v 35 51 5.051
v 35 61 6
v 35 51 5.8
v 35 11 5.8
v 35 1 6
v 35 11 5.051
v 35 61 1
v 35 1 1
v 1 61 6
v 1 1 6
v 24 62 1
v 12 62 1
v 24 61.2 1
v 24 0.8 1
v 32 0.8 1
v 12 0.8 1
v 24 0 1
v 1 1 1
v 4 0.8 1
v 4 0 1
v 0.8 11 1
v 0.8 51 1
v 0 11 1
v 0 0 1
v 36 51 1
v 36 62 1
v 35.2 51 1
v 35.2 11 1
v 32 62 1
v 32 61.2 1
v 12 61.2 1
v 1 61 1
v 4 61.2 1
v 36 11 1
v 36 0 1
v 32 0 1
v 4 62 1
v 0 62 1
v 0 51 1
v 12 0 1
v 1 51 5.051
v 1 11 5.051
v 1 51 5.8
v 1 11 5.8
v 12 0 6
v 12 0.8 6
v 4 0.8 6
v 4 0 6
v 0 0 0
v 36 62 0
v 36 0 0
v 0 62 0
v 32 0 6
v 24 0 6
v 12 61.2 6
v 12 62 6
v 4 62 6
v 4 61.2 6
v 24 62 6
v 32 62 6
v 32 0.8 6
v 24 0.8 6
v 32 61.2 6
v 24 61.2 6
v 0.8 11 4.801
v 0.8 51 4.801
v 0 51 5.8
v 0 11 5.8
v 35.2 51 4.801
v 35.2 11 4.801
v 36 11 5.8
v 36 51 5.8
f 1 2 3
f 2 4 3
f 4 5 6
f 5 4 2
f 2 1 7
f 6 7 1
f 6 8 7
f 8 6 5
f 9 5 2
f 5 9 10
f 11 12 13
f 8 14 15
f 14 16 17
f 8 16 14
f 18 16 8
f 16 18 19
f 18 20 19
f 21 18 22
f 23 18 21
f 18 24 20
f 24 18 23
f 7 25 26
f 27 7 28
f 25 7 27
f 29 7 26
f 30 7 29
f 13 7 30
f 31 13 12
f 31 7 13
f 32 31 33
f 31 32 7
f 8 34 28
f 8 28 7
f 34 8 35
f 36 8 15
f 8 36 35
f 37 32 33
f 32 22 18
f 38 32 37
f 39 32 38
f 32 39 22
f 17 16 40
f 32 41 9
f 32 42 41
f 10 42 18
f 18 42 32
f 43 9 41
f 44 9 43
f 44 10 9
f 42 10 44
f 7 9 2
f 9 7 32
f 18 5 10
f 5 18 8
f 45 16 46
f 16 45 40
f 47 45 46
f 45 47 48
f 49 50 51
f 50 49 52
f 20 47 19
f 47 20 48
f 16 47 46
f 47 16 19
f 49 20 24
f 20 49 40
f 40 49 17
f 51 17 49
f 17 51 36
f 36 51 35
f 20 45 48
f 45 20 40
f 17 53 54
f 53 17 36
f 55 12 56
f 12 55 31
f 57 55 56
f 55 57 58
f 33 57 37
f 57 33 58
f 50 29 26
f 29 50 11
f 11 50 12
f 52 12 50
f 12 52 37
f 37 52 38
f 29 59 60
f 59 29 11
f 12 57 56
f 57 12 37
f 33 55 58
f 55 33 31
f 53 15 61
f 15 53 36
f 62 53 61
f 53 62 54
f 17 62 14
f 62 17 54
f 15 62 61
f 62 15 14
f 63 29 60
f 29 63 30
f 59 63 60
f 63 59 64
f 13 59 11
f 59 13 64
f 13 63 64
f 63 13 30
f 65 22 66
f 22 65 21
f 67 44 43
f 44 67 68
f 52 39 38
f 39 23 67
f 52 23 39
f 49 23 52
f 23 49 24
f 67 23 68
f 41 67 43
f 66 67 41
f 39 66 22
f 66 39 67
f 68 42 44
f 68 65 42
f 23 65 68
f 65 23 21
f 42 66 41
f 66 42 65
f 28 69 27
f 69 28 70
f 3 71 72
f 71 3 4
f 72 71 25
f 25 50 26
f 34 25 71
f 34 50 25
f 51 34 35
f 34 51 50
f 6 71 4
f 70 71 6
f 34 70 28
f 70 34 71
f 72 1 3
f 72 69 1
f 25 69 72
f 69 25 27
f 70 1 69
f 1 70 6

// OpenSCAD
EPSILON = 0.001;

BATTERY1200_WIDTH = 34;
BATTERY1200_DEPTH = 60;
BATTERY1200_HEIGHT = 5;

BATTERY1200_HOLDER_WALL_THICKNESS = 0.8;
BATTERY1200_MARGIN = 0.2;

function Battery1200mAh_holderWidth() =
    BATTERY1200_WIDTH + 2 * (BATTERY1200_HOLDER_WALL_THICKNESS + BATTERY1200_MARGIN);
function Battery1200mAh_holderDepth() =
    BATTERY1200_DEPTH + 2 * (BATTERY1200_HOLDER_WALL_THICKNESS + BATTERY1200_MARGIN);

/**
 * 1200 mAh Battery.
 *
 * @param positiveShape
 *     if true, draw only the positive part.
 *     if false, draw only the negative part.
 */
module Battery1200mAh(baseThickness = 0.8, positiveShape = true) {
    if (positiveShape) {
        translate([BATTERY1200_HOLDER_WALL_THICKNESS + BATTERY1200_MARGIN,
                   BATTERY1200_HOLDER_WALL_THICKNESS + BATTERY1200_MARGIN,
                   baseThickness])
            cube([BATTERY1200_WIDTH, BATTERY1200_DEPTH, BATTERY1200_HEIGHT]);
    }
}

/**
 * 1200 mAh Battery holder.
 *
 * @param positiveShape
 *     if true, draw only the positive part.
 *     if false, draw only the negative part.
 */
module Battery1200mAh_holder(baseThickness = 0.8, positiveShape = true) {
    // Base
    baseWidth = Battery1200mAh_holderWidth();
    baseHeight = Battery1200mAh_holderDepth();
    if (positiveShape)
        cube([baseWidth, baseHeight, baseThickness]);
    
    // Top and bottom walls
    if (positiveShape) {
        wallWidth = 8;
        wallSideMargin = 4;
        for (x = [wallSideMargin, baseWidth - wallWidth - wallSideMargin])
            for (y = [0, baseHeight - baseThickness + BATTERY1200_MARGIN])
                translate([x, y, 0])
                    cube([wallWidth,
                          BATTERY1200_HOLDER_WALL_THICKNESS,
                          BATTERY1200_HEIGHT + baseThickness]);
    }
    
    // Left and right walls
    if (positiveShape) {
        wallDepth = 40;
        horizontalHolderWidth = BATTERY1200_HOLDER_WALL_THICKNESS;
        horizontalHolderHeight = BATTERY1200_HOLDER_WALL_THICKNESS + baseThickness + 
                                 BATTERY1200_HEIGHT - 1;
        
        for (x = [0, baseWidth])
            translate([x, (baseHeight - wallDepth) / 2 + (x > 0 ? wallDepth : 0), 0])
                rotate([0, 0, x > 0 ? 180 : 0]) {
                    cube([BATTERY1200_HOLDER_WALL_THICKNESS, wallDepth, horizontalHolderHeight]);
                    
                    translate([horizontalHolderWidth - EPSILON, 0, horizontalHolderHeight])
                        rotate([-90, 0, 0])
                            linear_extrude(height = wallDepth)
                                polygon(points = [[0, 0],
                                                 [horizontalHolderWidth, 0],
                                                 [0, horizontalHolderWidth + 0.2]]);
                }
            
    }
}

color("orange")
    difference() {
        Battery1200mAh(1, true);
        Battery1200mAh(1, false);
    }

difference() {
    Battery1200mAh_holder(1, true);
    Battery1200mAh_holder(1, false);
}
